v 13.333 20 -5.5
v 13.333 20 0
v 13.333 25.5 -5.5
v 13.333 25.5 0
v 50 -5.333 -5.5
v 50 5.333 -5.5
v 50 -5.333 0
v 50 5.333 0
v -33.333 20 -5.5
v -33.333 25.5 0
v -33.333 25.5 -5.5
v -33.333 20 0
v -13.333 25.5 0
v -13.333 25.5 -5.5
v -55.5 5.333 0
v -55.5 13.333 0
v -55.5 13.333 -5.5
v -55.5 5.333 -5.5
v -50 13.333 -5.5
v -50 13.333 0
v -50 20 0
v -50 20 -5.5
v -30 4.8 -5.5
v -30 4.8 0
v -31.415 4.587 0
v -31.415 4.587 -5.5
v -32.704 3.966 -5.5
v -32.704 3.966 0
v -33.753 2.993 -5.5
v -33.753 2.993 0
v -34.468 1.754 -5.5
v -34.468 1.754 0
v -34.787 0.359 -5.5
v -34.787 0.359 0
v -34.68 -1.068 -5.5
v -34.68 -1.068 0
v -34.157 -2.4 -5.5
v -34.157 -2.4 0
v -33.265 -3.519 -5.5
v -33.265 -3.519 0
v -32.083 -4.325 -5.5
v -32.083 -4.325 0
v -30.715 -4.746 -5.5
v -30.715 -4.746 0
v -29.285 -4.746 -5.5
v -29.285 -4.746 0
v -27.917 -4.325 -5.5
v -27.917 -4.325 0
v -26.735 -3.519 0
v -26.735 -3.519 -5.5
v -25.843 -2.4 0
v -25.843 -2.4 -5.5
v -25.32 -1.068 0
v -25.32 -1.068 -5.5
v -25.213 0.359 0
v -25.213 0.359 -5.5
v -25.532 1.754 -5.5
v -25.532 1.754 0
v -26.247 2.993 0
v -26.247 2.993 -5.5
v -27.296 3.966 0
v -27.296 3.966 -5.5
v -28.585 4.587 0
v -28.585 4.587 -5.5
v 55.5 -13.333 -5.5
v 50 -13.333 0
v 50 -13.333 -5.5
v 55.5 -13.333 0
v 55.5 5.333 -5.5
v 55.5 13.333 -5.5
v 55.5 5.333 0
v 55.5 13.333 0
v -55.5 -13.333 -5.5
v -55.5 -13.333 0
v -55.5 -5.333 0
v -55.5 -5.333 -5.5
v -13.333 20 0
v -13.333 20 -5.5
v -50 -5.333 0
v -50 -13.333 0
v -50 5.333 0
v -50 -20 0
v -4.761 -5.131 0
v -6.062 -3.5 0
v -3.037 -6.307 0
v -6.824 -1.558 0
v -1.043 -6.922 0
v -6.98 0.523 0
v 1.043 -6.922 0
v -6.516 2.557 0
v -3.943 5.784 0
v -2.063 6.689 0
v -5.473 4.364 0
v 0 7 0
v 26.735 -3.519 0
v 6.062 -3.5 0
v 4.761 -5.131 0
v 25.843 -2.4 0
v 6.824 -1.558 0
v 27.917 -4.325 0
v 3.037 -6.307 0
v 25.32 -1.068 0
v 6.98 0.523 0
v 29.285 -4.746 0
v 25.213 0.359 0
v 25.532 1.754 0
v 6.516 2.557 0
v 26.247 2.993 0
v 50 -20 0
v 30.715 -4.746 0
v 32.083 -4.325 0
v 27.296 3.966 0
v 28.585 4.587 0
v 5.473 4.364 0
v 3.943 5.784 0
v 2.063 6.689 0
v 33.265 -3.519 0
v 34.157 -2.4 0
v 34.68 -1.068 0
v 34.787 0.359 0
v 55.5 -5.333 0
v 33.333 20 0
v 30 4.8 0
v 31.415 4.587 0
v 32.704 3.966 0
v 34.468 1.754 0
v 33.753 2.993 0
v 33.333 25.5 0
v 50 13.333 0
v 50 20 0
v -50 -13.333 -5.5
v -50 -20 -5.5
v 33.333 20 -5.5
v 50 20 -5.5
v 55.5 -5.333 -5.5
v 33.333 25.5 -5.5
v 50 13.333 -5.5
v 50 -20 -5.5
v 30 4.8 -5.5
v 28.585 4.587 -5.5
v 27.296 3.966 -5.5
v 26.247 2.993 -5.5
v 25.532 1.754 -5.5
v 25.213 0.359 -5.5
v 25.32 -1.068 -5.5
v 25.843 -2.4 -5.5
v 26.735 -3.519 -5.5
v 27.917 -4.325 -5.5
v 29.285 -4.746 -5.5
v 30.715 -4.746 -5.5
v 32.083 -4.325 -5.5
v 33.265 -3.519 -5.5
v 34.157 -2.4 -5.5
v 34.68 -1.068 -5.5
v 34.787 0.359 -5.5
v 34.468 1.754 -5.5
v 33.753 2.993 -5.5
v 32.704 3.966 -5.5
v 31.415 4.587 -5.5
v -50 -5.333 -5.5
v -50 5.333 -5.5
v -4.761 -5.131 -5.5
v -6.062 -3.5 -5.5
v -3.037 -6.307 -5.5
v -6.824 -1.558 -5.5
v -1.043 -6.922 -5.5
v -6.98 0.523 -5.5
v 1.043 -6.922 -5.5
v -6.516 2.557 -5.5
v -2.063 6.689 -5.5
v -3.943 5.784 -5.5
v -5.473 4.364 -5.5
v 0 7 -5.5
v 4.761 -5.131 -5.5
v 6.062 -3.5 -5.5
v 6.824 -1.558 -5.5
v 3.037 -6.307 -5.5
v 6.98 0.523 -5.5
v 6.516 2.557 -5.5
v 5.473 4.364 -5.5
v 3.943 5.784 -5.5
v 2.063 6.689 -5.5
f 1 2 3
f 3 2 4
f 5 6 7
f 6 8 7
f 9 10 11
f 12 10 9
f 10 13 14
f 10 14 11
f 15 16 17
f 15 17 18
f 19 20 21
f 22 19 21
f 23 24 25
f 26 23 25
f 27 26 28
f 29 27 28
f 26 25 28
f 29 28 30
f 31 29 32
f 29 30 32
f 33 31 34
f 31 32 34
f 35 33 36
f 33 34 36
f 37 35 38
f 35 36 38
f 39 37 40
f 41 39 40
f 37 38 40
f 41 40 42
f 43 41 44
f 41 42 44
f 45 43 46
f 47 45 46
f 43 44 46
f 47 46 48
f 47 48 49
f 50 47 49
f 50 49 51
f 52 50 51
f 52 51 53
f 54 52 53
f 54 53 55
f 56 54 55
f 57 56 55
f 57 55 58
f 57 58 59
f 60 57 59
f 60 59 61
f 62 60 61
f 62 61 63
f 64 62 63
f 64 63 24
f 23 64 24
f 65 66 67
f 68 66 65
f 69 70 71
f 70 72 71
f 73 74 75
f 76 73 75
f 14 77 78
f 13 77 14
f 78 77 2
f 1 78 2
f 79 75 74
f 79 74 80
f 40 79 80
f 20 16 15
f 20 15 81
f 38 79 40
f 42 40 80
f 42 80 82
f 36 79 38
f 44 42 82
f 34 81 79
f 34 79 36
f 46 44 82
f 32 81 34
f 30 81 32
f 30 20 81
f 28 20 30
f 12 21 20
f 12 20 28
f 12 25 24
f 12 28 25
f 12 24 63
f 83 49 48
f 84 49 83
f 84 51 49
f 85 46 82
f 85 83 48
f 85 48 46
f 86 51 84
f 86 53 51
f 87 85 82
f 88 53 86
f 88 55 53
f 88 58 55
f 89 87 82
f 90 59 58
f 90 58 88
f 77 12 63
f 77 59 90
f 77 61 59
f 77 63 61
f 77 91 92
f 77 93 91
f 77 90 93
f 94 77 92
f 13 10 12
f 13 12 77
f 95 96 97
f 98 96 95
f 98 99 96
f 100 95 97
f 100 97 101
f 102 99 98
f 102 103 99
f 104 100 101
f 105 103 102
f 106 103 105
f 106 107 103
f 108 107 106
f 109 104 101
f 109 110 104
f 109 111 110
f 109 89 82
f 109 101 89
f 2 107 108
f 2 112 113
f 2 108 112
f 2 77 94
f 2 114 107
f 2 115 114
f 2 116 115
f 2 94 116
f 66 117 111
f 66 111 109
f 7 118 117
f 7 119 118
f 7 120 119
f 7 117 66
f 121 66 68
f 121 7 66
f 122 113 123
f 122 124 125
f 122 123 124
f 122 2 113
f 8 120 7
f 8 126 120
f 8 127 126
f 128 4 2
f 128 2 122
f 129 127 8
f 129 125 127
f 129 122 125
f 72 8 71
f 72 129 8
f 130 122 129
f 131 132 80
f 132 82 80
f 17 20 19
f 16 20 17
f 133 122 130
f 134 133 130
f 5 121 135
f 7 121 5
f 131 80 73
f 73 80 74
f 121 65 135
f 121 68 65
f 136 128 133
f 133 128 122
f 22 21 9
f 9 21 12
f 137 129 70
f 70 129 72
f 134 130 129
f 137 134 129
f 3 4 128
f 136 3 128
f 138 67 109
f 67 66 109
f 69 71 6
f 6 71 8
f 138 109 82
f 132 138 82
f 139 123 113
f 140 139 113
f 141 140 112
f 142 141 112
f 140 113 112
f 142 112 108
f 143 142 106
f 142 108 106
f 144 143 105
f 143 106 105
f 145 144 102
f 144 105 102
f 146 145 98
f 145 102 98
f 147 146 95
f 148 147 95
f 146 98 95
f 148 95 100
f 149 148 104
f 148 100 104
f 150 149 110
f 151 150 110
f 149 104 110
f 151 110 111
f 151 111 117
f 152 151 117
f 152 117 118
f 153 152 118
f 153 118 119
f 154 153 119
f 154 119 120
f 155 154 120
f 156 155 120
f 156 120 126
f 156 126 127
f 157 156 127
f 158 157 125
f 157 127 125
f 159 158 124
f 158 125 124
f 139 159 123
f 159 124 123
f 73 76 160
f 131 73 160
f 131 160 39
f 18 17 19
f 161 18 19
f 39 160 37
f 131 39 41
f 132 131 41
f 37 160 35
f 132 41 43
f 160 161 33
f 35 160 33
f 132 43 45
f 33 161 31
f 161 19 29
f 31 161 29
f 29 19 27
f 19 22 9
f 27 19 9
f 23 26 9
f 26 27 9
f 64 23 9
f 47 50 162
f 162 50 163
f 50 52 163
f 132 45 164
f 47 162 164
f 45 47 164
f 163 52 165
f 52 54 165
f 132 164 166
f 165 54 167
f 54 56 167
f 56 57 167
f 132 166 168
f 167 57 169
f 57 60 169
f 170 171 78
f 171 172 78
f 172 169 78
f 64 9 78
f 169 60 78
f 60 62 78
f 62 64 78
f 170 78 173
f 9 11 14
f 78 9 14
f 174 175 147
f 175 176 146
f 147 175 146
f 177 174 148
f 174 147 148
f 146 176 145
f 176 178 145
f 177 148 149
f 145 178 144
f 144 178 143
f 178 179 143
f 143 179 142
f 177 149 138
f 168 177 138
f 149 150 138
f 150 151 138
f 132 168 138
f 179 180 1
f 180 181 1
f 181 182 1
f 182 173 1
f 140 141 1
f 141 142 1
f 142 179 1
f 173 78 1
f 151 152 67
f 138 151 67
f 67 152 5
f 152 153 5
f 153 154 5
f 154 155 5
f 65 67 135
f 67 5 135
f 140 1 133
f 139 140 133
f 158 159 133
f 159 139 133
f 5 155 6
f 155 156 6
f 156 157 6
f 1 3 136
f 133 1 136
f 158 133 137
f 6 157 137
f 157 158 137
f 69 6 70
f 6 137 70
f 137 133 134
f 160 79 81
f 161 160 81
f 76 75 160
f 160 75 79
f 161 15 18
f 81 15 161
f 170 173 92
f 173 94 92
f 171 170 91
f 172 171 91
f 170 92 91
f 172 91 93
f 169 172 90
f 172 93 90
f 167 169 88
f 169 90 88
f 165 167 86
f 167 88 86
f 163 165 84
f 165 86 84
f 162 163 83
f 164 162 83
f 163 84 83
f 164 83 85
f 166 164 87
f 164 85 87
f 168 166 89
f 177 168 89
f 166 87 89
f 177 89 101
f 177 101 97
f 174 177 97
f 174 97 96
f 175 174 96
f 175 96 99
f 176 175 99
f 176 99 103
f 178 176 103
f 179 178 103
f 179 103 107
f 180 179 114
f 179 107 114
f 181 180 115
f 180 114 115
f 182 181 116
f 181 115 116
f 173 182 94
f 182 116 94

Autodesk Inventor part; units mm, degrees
ref_plane "YZ Plane" through (0, 0, 0) normal (1, 0, 0) x (0, 1, 0)
ref_plane "XZ Plane" through (0, 0, 0) normal (0, 1, 0) x (-1, 0, 0)
ref_plane "XY Plane" through (0, 0, 0) normal (0, 0, 1) x (1, 0, 0)
sketch "Block1" plane through (0, 0, 0) normal (0, 0, 1) x (1, 0, 0)
  line L0 (-37.5521, 20) -> (-37.5521, 24)
  line L1 (-37.5521, 24) -> (-17.5521, 24)
  line L2 (-17.5521, 24) -> (-17.5521, 20)
  line L3 (-37.4196, 20) -> (-17.5521, 20)
  line L4 (17.5521, 24) -> (17.5521, 20)
  line L5 (37.5521, 20) -> (37.5521, 24)
  line L6 (37.5521, 24) -> (17.5521, 24)
  line L7 (37.4196, 20) -> (17.5521, 20)
  point P0 (0, 21.8462)
  dimension "d140" = 20
  dimension "d141" = 4
sketch "Block2" plane through (0, 0, 0) normal (0, 0, 1) x (1, 0, 0)
  line L0 (-33.5533, 20.22) -> (-33.5533, 29.22)
  line L1 (-33.5533, 29.22) -> (-13.1133, 29.22)
  line L2 (-13.1133, 29.22) -> (-13.1133, 20.22)
  line L3 (-13.1133, 20.22) -> (13.1133, 20.22)
  line L4 (13.1133, 20.22) -> (13.1133, 29.22)
  line L5 (13.1133, 29.22) -> (33.5533, 29.22)
  line L6 (33.5533, 29.22) -> (33.5533, 20.22)
  line L7 (33.5533, 20.22) -> (50.22, 20.22)
  line L8 (50.22, 20.22) -> (50.22, 13.5533)
  line L9 (50.22, 13.5533) -> (59.22, 13.5533)
  line L10 (59.22, 13.5533) -> (59.22, 5.1133)
  line L11 (59.22, 5.1133) -> (50.22, 5.1133)
  line L12 (50.22, 5.1133) -> (50.22, -5.1133)
  line L13 (50.22, -5.1133) -> (59.22, -5.1133)
  line L14 (59.22, -5.1133) -> (59.22, -13.5533)
  line L15 (59.22, -13.5533) -> (50.22, -13.5533)
  line L16 (50.22, -13.5533) -> (50.22, -20.22)
  line L17 (50.22, -20.22) -> (-50.22, -20.22)
  line L18 (-50.22, -20.22) -> (-50.22, -13.5533)
  line L19 (-50.22, -13.5533) -> (-59.22, -13.5533)
  line L20 (-59.22, -13.5533) -> (-59.22, -5.1133)
  line L21 (-59.22, -5.1133) -> (-50.22, -5.1133)
  line L22 (-50.22, -5.1133) -> (-50.22, 5.1133)
  line L23 (-50.22, 5.1133) -> (-59.22, 5.1133)
  line L24 (-59.22, 5.1133) -> (-59.22, 13.5533)
  line L25 (-59.22, 13.5533) -> (-50.22, 13.5533)
  line L26 (-50.22, 13.5533) -> (-50.22, 20.22)
  line L27 (-50.22, 20.22) -> (-33.5533, 20.22)
  circle A0 centre (-30, 0) radius 4.72
  circle A1 centre (0, 0) radius 4.72
  circle A2 centre (30, 0) radius 4.72
  point P0 (0, 6.592)
sketch "Block3" plane through (0, 0, 0) normal (0, 0, 1) x (1, 0, 0)
  line L0 (-33.4333, 29.1) -> (-13.2333, 29.1)
  line L1 (-13.2333, 29.1) -> (-13.2333, 20.1)
  line L2 (-13.2333, 20.1) -> (13.2333, 20.1)
  line L3 (13.2333, 20.1) -> (13.2333, 29.1)
  line L4 (13.2333, 29.1) -> (33.4333, 29.1)
  line L5 (33.4333, 29.1) -> (33.4333, 20.1)
  line L6 (33.4333, 20.1) -> (50.1, 20.1)
  line L7 (50.1, 20.1) -> (50.1, 13.4333)
  line L8 (50.1, 13.4333) -> (59.1, 13.4333)
  line L9 (59.1, 13.4333) -> (59.1, 5.2333)
  line L10 (59.1, 5.2333) -> (50.1, 5.2333)
  line L11 (50.1, 5.2333) -> (50.1, -5.2333)
  line L12 (50.1, -5.2333) -> (59.1, -5.2333)
  line L13 (59.1, -5.2333) -> (59.1, -13.4333)
  line L14 (59.1, -13.4333) -> (50.1, -13.4333)
  line L15 (50.1, -13.4333) -> (50.1, -20.1)
  line L16 (50.1, -20.1) -> (-50.1, -20.1)
  line L17 (-50.1, -20.1) -> (-50.1, -13.4333)
  line L18 (-50.1, -13.4333) -> (-59.1, -13.4333)
  line L19 (-59.1, -13.4333) -> (-59.1, -5.2333)
  line L20 (-59.1, -5.2333) -> (-50.1, -5.2333)
  line L21 (-50.1, -5.2333) -> (-50.1, 5.2333)
  line L22 (-50.1, 5.2333) -> (-59.1, 5.2333)
  line L23 (-59.1, 5.2333) -> (-59.1, 13.4333)
  line L24 (-59.1, 13.4333) -> (-50.1, 13.4333)
  line L25 (-50.1, 13.4333) -> (-50.1, 20.1)
  line L26 (-50.1, 20.1) -> (-33.4333, 20.1)
  line L27 (-33.4333, 20.1) -> (-33.4333, 29.1)
  circle A0 centre (-30, 0) radius 5.6
  circle A1 centre (0, 0) radius 7.1
  circle A2 centre (30, 0) radius 5.6
  point P0 (0, 6.56)
sketch "Block4" plane through (0, 0, 0) normal (0, 0, 1) x (1, 0, 0)
  line L0 (-33.5333, 29.2) -> (-13.1333, 29.2)
  line L1 (-13.1333, 29.2) -> (-13.1333, 20.2)
  line L2 (-13.1333, 20.2) -> (13.1333, 20.2)
  line L3 (13.1333, 20.2) -> (13.1333, 29.2)
  line L4 (13.1333, 29.2) -> (33.5333, 29.2)
  line L5 (33.5333, 29.2) -> (33.5333, 20.2)
  line L6 (33.5333, 20.2) -> (50.2, 20.2)
  line L7 (50.2, 20.2) -> (50.2, 13.5333)
  line L8 (50.2, 13.5333) -> (59.2, 13.5333)
  line L9 (59.2, 13.5333) -> (59.2, 5.1333)
  line L10 (59.2, 5.1333) -> (50.2, 5.1333)
  line L11 (50.2, 5.1333) -> (50.2, -5.1333)
  line L12 (50.2, -5.1333) -> (59.2, -5.1333)
  line L13 (59.2, -5.1333) -> (59.2, -13.5333)
  line L14 (59.2, -13.5333) -> (50.2, -13.5333)
  line L15 (50.2, -13.5333) -> (50.2, -20.2)
  line L16 (50.2, -20.2) -> (-50.2, -20.2)
  line L17 (-50.2, -20.2) -> (-50.2, -13.5333)
  line L18 (-50.2, -13.5333) -> (-59.2, -13.5333)
  line L19 (-59.2, -13.5333) -> (-59.2, -5.1333)
  line L20 (-59.2, -5.1333) -> (-50.2, -5.1333)
  line L21 (-50.2, -5.1333) -> (-50.2, 5.1333)
  line L22 (-50.2, 5.1333) -> (-59.2, 5.1333)
  line L23 (-59.2, 5.1333) -> (-59.2, 13.5333)
  line L24 (-59.2, 13.5333) -> (-50.2, 13.5333)
  line L25 (-50.2, 13.5333) -> (-50.2, 20.2)
  line L26 (-50.2, 20.2) -> (-33.5333, 20.2)
  line L27 (-33.5333, 20.2) -> (-33.5333, 29.2)
  circle A0 centre (-30, 0) radius 5.7
  circle A1 centre (0, 0) radius 7.2
  circle A2 centre (30, 0) radius 5.7
  point P0 (0, 6.5867)
sketch "Block5" plane through (0, 0, 0) normal (0, 0, 1) x (1, 0, 0)
  line L0 (13.2333, 29.1) -> (33.4333, 29.1)
  line L1 (33.4333, 29.1) -> (33.4333, 20.1)
  line L2 (33.4333, 20.1) -> (50.1, 20.1)
  line L3 (50.1, 20.1) -> (50.1, 13.4333)
  line L4 (50.1, 13.4333) -> (59.1, 13.4333)
  line L5 (59.1, 13.4333) -> (59.1, 5.2333)
  line L6 (59.1, 5.2333) -> (50.1, 5.2333)
  line L7 (50.1, 5.2333) -> (50.1, -5.2333)
  line L8 (50.1, -5.2333) -> (59.1, -5.2333)
  line L9 (59.1, -5.2333) -> (59.1, -13.4333)
  line L10 (59.1, -13.4333) -> (50.1, -13.4333)
  line L11 (50.1, -13.4333) -> (50.1, -20.1)
  line L12 (50.1, -20.1) -> (-50.1, -20.1)
  line L13 (-50.1, -20.1) -> (-50.1, -13.4333)
  line L14 (-50.1, -13.4333) -> (-59.1, -13.4333)
  line L15 (-59.1, -13.4333) -> (-59.1, -5.2333)
  line L16 (-59.1, -5.2333) -> (-50.1, -5.2333)
  line L17 (-50.1, -5.2333) -> (-50.1, 5.2333)
  line L18 (-50.1, 5.2333) -> (-59.1, 5.2333)
  line L19 (-59.1, 5.2333) -> (-59.1, 13.4333)
  line L20 (-59.1, 13.4333) -> (-50.1, 13.4333)
  line L21 (-50.1, 13.4333) -> (-50.1, 20.1)
  line L22 (-50.1, 20.1) -> (-33.4333, 20.1)
  line L23 (-33.4333, 20.1) -> (-33.4333, 29.1)
  line L24 (-33.4333, 29.1) -> (-13.2333, 29.1)
  line L25 (-13.2333, 29.1) -> (-13.2333, 20.1)
  line L26 (-13.2333, 20.1) -> (13.2333, 20.1)
  line L27 (13.2333, 20.1) -> (13.2333, 29.1)
  circle A0 centre (-30, 0) radius 5.6
  circle A1 centre (0, 0) radius 7.1
  circle A2 centre (30, 0) radius 5.6
  point P0 (0, 6.56)
sketch "Block6" plane through (0, 0, 0) normal (0, 0, 1) x (1, 0, 0)
  line L0 (-33.4133, 25.58) -> (-13.2533, 25.58)
  line L1 (-13.2533, 25.58) -> (-13.2533, 20.08)
  line L2 (-13.2533, 20.08) -> (13.2533, 20.08)
  line L3 (13.2533, 20.08) -> (13.2533, 25.58)
  line L4 (13.2533, 25.58) -> (33.4133, 25.58)
  line L5 (33.4133, 25.58) -> (33.4133, 20.08)
  line L6 (33.4133, 20.08) -> (50.08, 20.08)
  line L7 (50.08, 20.08) -> (50.08, 13.4133)
  line L8 (50.08, 13.4133) -> (55.58, 13.4133)
  line L9 (55.58, 13.4133) -> (55.58, 5.2533)
  line L10 (55.58, 5.2533) -> (50.08, 5.2533)
  line L11 (50.08, 5.2533) -> (50.08, -5.2533)
  line L12 (50.08, -5.2533) -> (55.58, -5.2533)
  line L13 (55.58, -5.2533) -> (55.58, -13.4133)
  line L14 (55.58, -13.4133) -> (50.08, -13.4133)
  line L15 (50.08, -13.4133) -> (50.08, -20.08)
  line L16 (50.08, -20.08) -> (-50.08, -20.08)
  line L17 (-50.08, -20.08) -> (-50.08, -13.4133)
  line L18 (-50.08, -13.4133) -> (-55.58, -13.4133)
  line L19 (-55.58, -13.4133) -> (-55.58, -5.2533)
  line L20 (-55.58, -5.2533) -> (-50.08, -5.2533)
  line L21 (-50.08, -5.2533) -> (-50.08, 5.2533)
  line L22 (-50.08, 5.2533) -> (-55.58, 5.2533)
  line L23 (-55.58, 5.2533) -> (-55.58, 13.4133)
  line L24 (-55.58, 13.4133) -> (-50.08, 13.4133)
  line L25 (-50.08, 13.4133) -> (-50.08, 20.08)
  line L26 (-50.08, 20.08) -> (-33.4133, 20.08)
  line L27 (-33.4133, 20.08) -> (-33.4133, 25.58)
  circle A0 centre (-30, 0) radius 5.58
  circle A1 centre (0, 0) radius 7.08
  circle A2 centre (30, 0) radius 5.58
  point P0 (0, 6.088)
sketch "Block7" plane through (0, 0, 0) normal (0, 0, 1) x (1, 0, 0)
  line L0 (-33.4133, 25.58) -> (-13.2533, 25.58)
  line L1 (-13.2533, 25.58) -> (-13.2533, 20.08)
  line L2 (-13.2533, 20.08) -> (13.2533, 20.08)
  line L3 (13.2533, 20.08) -> (13.2533, 25.58)
  line L4 (13.2533, 25.58) -> (33.4133, 25.58)
  line L5 (33.4133, 25.58) -> (33.4133, 20.08)
  line L6 (33.4133, 20.08) -> (50.08, 20.08)
  line L7 (50.08, 20.08) -> (50.08, 13.4133)
  line L8 (50.08, 13.4133) -> (55.58, 13.4133)
  line L9 (55.58, 13.4133) -> (55.58, 5.2533)
  line L10 (55.58, 5.2533) -> (50.08, 5.2533)
  line L11 (50.08, 5.2533) -> (50.08, -5.2533)
  line L12 (50.08, -5.2533) -> (55.58, -5.2533)
  line L13 (55.58, -5.2533) -> (55.58, -13.4133)
  line L14 (55.58, -13.4133) -> (50.08, -13.4133)
  line L15 (50.08, -13.4133) -> (50.08, -20.08)
  line L16 (50.08, -20.08) -> (-50.08, -20.08)
  line L17 (-50.08, -20.08) -> (-50.08, -13.4133)
  line L18 (-50.08, -13.4133) -> (-55.58, -13.4133)
  line L19 (-55.58, -13.4133) -> (-55.58, -5.2533)
  line L20 (-55.58, -5.2533) -> (-50.08, -5.2533)
  line L21 (-50.08, -5.2533) -> (-50.08, 5.2533)
  line L22 (-50.08, 5.2533) -> (-55.58, 5.2533)
  line L23 (-55.58, 5.2533) -> (-55.58, 13.4133)
  line L24 (-55.58, 13.4133) -> (-50.08, 13.4133)
  line L25 (-50.08, 13.4133) -> (-50.08, 20.08)
  line L26 (-50.08, 20.08) -> (-33.4133, 20.08)
  line L27 (-33.4133, 20.08) -> (-33.4133, 25.58)
  circle A0 centre (-30, 0) radius 4.88
  circle A1 centre (0, 0) radius 7.08
  circle A2 centre (30, 0) radius 4.88
  point P0 (0, 6.088)
sketch "Sketch10" plane through (0, 0, 0) normal (0, 0, 1) x (1, 0, 0)
  line L0 (50, -20) -> (-50, -20)
  line L1 (-50, -20) -> (-50, 20)
  line L2 (-50, 20) -> (50, 20)
  line L3 (50, 20) -> (50, -20)
  line L4 (50, -20) -> (-50, 20) construction
  line L5 (-50, -20) -> (50, 20) construction
  point P0 (0, 0)
  dimension "d21" = 100
  dimension "d22" = 40
extrude "Extrusion2" add sketch "Sketch10" against normal blind 5.5
sketch "Sketch16" plane through (0, 0, -5.5) normal (0, 0, -1) x (-1, 0, 0)
  line L0 (0, -30.0399) -> (0, 39.5395) projected
  point P0 (0, 0)
  point P1 (-30, 0)
  point P2 (30, 0)
  dimension "d52" = 60
hole "Hole5" at (30, 0, -5.5) at (-30, 0, -5.5) direction (0, 0, 1) diameter 9.6 end through all
sketch "Sketch17" plane through (0, 0, -5.5) normal (0, 0, -1) x (-1, 0, 0)
  point P0 (0, 0)
  point P1 (0, 0)
hole "Hole14" at (0, 0, -5.5) direction (0, 0, 1) diameter 14 end through all
sketch "Sketch34" plane through (0, 0, 0) normal (0, 0, 1) x (1, 0, 0)
  line L0 (-50, 20) -> (50, 20) projected
  line L1 (-50, -20) -> (-50, 20) projected
  line L2 (-30, 20) -> (-10, 20)
  line L3 (0, -30.0399) -> (0, 39.5395) projected
  line L4 (-234.7041, 0) -> (108.0673, 0) projected
  line L5 (-30, 20) -> (-30, 25.5)
  line L6 (-10, 20) -> (-10, 25.5)
  line L7 (-10, 25.5) -> (-30, 25.5)
  line L8 (30, 20) -> (10, 20)
  line L9 (30, 20) -> (30, 25.5)
  line L10 (10, 20) -> (10, 25.5)
  line L11 (10, 25.5) -> (30, 25.5)
  line L12 (-50, 13.3333) -> (-55.5, 13.3333)
  line L13 (-55.5, 13.3333) -> (-55.5, 5.3333)
  line L14 (-55.5, 5.3333) -> (-50, 5.3333)
  line L15 (-50, 13.3333) -> (-50, 5.3333)
  line L16 (50, 13.3333) -> (55.5, 13.3333)
  line L17 (55.5, 13.3333) -> (55.5, 5.3333)
  line L18 (55.5, 5.3333) -> (50, 5.3333)
  line L19 (50, 13.3333) -> (50, 5.3333)
  line L20 (-50, -13.3333) -> (-55.5, -13.3333)
  line L21 (-55.5, -13.3333) -> (-55.5, -5.3333)
  line L22 (-55.5, -5.3333) -> (-50, -5.3333)
  line L23 (-50, -13.3333) -> (-50, -5.3333)
  line L24 (50, -13.3333) -> (50, -5.3333)
  line L25 (55.5, -13.3333) -> (55.5, -5.3333)
  line L26 (55.5, -5.3333) -> (50, -5.3333)
  line L27 (50, -13.3333) -> (55.5, -13.3333)
  dimension "d131" = 20
  dimension "d132" = 5.5
  dimension "d133" = 5.5
  dimension "d134" = 8
  dimension "d135" = 6.6667
extrude "Extrusion4" add sketch "Sketch34" against normal blind 5.5 contours L1 L20 L21 L22 | L1 L14 L13 L12 | L16 L17 L18 L19 | L24 L26 L25 L27
sketch "Sketch35" plane through (0, 0, 0) normal (0, 0, 1) x (1, 0, 0)
  line L0 (-50, 20) -> (50, 20) projected
  line L1 (-50, 13.3333) -> (-50, 20) projected
  line L2 (0, -30.0399) -> (0, 39.5395) projected
  line L3 (-33.3333, 20) -> (-13.3333, 20)
  line L4 (-13.3333, 20) -> (-13.3333, 25.5)
  line L5 (-13.3333, 25.5) -> (-33.3333, 25.5)
  line L6 (-33.3333, 25.5) -> (-33.3333, 20)
  line L7 (33.3333, 20) -> (13.3333, 20)
  line L8 (13.3333, 20) -> (13.3333, 25.5)
  line L9 (13.3333, 25.5) -> (33.3333, 25.5)
  line L10 (33.3333, 25.5) -> (33.3333, 20)
  dimension "d142" = 16.6667
  dimension "d143" = 20
  dimension "d144" = 5.5
extrude "Extrusion5" add sketch "Sketch35" against normal blind 5.5
equation "\"d140\" = 0.2 * d21"
equation "\"d141\" = At"
equation "\"d23\" = Wt"
equation "\"d131\" = 0.2 * d21"
equation "\"d132\" = Wt"
equation "\"d133\" = Wt"
equation "\"d134\" = 0.2 * d22"
equation "\"d135\" = 0.166667 * d22"
equation "\"d138\" = Wt"
equation "\"d142\" = 0.166667 * d21"
equation "\"d143\" = 0.2 * d21"
equation "\"d144\" = Wt"
equation "\"d145\" = Wt"
equation "\"At\" = 4"
equation "\"Wt\" = 5.5"
properties part number "holder_plate" material "Wood (Birch)"
